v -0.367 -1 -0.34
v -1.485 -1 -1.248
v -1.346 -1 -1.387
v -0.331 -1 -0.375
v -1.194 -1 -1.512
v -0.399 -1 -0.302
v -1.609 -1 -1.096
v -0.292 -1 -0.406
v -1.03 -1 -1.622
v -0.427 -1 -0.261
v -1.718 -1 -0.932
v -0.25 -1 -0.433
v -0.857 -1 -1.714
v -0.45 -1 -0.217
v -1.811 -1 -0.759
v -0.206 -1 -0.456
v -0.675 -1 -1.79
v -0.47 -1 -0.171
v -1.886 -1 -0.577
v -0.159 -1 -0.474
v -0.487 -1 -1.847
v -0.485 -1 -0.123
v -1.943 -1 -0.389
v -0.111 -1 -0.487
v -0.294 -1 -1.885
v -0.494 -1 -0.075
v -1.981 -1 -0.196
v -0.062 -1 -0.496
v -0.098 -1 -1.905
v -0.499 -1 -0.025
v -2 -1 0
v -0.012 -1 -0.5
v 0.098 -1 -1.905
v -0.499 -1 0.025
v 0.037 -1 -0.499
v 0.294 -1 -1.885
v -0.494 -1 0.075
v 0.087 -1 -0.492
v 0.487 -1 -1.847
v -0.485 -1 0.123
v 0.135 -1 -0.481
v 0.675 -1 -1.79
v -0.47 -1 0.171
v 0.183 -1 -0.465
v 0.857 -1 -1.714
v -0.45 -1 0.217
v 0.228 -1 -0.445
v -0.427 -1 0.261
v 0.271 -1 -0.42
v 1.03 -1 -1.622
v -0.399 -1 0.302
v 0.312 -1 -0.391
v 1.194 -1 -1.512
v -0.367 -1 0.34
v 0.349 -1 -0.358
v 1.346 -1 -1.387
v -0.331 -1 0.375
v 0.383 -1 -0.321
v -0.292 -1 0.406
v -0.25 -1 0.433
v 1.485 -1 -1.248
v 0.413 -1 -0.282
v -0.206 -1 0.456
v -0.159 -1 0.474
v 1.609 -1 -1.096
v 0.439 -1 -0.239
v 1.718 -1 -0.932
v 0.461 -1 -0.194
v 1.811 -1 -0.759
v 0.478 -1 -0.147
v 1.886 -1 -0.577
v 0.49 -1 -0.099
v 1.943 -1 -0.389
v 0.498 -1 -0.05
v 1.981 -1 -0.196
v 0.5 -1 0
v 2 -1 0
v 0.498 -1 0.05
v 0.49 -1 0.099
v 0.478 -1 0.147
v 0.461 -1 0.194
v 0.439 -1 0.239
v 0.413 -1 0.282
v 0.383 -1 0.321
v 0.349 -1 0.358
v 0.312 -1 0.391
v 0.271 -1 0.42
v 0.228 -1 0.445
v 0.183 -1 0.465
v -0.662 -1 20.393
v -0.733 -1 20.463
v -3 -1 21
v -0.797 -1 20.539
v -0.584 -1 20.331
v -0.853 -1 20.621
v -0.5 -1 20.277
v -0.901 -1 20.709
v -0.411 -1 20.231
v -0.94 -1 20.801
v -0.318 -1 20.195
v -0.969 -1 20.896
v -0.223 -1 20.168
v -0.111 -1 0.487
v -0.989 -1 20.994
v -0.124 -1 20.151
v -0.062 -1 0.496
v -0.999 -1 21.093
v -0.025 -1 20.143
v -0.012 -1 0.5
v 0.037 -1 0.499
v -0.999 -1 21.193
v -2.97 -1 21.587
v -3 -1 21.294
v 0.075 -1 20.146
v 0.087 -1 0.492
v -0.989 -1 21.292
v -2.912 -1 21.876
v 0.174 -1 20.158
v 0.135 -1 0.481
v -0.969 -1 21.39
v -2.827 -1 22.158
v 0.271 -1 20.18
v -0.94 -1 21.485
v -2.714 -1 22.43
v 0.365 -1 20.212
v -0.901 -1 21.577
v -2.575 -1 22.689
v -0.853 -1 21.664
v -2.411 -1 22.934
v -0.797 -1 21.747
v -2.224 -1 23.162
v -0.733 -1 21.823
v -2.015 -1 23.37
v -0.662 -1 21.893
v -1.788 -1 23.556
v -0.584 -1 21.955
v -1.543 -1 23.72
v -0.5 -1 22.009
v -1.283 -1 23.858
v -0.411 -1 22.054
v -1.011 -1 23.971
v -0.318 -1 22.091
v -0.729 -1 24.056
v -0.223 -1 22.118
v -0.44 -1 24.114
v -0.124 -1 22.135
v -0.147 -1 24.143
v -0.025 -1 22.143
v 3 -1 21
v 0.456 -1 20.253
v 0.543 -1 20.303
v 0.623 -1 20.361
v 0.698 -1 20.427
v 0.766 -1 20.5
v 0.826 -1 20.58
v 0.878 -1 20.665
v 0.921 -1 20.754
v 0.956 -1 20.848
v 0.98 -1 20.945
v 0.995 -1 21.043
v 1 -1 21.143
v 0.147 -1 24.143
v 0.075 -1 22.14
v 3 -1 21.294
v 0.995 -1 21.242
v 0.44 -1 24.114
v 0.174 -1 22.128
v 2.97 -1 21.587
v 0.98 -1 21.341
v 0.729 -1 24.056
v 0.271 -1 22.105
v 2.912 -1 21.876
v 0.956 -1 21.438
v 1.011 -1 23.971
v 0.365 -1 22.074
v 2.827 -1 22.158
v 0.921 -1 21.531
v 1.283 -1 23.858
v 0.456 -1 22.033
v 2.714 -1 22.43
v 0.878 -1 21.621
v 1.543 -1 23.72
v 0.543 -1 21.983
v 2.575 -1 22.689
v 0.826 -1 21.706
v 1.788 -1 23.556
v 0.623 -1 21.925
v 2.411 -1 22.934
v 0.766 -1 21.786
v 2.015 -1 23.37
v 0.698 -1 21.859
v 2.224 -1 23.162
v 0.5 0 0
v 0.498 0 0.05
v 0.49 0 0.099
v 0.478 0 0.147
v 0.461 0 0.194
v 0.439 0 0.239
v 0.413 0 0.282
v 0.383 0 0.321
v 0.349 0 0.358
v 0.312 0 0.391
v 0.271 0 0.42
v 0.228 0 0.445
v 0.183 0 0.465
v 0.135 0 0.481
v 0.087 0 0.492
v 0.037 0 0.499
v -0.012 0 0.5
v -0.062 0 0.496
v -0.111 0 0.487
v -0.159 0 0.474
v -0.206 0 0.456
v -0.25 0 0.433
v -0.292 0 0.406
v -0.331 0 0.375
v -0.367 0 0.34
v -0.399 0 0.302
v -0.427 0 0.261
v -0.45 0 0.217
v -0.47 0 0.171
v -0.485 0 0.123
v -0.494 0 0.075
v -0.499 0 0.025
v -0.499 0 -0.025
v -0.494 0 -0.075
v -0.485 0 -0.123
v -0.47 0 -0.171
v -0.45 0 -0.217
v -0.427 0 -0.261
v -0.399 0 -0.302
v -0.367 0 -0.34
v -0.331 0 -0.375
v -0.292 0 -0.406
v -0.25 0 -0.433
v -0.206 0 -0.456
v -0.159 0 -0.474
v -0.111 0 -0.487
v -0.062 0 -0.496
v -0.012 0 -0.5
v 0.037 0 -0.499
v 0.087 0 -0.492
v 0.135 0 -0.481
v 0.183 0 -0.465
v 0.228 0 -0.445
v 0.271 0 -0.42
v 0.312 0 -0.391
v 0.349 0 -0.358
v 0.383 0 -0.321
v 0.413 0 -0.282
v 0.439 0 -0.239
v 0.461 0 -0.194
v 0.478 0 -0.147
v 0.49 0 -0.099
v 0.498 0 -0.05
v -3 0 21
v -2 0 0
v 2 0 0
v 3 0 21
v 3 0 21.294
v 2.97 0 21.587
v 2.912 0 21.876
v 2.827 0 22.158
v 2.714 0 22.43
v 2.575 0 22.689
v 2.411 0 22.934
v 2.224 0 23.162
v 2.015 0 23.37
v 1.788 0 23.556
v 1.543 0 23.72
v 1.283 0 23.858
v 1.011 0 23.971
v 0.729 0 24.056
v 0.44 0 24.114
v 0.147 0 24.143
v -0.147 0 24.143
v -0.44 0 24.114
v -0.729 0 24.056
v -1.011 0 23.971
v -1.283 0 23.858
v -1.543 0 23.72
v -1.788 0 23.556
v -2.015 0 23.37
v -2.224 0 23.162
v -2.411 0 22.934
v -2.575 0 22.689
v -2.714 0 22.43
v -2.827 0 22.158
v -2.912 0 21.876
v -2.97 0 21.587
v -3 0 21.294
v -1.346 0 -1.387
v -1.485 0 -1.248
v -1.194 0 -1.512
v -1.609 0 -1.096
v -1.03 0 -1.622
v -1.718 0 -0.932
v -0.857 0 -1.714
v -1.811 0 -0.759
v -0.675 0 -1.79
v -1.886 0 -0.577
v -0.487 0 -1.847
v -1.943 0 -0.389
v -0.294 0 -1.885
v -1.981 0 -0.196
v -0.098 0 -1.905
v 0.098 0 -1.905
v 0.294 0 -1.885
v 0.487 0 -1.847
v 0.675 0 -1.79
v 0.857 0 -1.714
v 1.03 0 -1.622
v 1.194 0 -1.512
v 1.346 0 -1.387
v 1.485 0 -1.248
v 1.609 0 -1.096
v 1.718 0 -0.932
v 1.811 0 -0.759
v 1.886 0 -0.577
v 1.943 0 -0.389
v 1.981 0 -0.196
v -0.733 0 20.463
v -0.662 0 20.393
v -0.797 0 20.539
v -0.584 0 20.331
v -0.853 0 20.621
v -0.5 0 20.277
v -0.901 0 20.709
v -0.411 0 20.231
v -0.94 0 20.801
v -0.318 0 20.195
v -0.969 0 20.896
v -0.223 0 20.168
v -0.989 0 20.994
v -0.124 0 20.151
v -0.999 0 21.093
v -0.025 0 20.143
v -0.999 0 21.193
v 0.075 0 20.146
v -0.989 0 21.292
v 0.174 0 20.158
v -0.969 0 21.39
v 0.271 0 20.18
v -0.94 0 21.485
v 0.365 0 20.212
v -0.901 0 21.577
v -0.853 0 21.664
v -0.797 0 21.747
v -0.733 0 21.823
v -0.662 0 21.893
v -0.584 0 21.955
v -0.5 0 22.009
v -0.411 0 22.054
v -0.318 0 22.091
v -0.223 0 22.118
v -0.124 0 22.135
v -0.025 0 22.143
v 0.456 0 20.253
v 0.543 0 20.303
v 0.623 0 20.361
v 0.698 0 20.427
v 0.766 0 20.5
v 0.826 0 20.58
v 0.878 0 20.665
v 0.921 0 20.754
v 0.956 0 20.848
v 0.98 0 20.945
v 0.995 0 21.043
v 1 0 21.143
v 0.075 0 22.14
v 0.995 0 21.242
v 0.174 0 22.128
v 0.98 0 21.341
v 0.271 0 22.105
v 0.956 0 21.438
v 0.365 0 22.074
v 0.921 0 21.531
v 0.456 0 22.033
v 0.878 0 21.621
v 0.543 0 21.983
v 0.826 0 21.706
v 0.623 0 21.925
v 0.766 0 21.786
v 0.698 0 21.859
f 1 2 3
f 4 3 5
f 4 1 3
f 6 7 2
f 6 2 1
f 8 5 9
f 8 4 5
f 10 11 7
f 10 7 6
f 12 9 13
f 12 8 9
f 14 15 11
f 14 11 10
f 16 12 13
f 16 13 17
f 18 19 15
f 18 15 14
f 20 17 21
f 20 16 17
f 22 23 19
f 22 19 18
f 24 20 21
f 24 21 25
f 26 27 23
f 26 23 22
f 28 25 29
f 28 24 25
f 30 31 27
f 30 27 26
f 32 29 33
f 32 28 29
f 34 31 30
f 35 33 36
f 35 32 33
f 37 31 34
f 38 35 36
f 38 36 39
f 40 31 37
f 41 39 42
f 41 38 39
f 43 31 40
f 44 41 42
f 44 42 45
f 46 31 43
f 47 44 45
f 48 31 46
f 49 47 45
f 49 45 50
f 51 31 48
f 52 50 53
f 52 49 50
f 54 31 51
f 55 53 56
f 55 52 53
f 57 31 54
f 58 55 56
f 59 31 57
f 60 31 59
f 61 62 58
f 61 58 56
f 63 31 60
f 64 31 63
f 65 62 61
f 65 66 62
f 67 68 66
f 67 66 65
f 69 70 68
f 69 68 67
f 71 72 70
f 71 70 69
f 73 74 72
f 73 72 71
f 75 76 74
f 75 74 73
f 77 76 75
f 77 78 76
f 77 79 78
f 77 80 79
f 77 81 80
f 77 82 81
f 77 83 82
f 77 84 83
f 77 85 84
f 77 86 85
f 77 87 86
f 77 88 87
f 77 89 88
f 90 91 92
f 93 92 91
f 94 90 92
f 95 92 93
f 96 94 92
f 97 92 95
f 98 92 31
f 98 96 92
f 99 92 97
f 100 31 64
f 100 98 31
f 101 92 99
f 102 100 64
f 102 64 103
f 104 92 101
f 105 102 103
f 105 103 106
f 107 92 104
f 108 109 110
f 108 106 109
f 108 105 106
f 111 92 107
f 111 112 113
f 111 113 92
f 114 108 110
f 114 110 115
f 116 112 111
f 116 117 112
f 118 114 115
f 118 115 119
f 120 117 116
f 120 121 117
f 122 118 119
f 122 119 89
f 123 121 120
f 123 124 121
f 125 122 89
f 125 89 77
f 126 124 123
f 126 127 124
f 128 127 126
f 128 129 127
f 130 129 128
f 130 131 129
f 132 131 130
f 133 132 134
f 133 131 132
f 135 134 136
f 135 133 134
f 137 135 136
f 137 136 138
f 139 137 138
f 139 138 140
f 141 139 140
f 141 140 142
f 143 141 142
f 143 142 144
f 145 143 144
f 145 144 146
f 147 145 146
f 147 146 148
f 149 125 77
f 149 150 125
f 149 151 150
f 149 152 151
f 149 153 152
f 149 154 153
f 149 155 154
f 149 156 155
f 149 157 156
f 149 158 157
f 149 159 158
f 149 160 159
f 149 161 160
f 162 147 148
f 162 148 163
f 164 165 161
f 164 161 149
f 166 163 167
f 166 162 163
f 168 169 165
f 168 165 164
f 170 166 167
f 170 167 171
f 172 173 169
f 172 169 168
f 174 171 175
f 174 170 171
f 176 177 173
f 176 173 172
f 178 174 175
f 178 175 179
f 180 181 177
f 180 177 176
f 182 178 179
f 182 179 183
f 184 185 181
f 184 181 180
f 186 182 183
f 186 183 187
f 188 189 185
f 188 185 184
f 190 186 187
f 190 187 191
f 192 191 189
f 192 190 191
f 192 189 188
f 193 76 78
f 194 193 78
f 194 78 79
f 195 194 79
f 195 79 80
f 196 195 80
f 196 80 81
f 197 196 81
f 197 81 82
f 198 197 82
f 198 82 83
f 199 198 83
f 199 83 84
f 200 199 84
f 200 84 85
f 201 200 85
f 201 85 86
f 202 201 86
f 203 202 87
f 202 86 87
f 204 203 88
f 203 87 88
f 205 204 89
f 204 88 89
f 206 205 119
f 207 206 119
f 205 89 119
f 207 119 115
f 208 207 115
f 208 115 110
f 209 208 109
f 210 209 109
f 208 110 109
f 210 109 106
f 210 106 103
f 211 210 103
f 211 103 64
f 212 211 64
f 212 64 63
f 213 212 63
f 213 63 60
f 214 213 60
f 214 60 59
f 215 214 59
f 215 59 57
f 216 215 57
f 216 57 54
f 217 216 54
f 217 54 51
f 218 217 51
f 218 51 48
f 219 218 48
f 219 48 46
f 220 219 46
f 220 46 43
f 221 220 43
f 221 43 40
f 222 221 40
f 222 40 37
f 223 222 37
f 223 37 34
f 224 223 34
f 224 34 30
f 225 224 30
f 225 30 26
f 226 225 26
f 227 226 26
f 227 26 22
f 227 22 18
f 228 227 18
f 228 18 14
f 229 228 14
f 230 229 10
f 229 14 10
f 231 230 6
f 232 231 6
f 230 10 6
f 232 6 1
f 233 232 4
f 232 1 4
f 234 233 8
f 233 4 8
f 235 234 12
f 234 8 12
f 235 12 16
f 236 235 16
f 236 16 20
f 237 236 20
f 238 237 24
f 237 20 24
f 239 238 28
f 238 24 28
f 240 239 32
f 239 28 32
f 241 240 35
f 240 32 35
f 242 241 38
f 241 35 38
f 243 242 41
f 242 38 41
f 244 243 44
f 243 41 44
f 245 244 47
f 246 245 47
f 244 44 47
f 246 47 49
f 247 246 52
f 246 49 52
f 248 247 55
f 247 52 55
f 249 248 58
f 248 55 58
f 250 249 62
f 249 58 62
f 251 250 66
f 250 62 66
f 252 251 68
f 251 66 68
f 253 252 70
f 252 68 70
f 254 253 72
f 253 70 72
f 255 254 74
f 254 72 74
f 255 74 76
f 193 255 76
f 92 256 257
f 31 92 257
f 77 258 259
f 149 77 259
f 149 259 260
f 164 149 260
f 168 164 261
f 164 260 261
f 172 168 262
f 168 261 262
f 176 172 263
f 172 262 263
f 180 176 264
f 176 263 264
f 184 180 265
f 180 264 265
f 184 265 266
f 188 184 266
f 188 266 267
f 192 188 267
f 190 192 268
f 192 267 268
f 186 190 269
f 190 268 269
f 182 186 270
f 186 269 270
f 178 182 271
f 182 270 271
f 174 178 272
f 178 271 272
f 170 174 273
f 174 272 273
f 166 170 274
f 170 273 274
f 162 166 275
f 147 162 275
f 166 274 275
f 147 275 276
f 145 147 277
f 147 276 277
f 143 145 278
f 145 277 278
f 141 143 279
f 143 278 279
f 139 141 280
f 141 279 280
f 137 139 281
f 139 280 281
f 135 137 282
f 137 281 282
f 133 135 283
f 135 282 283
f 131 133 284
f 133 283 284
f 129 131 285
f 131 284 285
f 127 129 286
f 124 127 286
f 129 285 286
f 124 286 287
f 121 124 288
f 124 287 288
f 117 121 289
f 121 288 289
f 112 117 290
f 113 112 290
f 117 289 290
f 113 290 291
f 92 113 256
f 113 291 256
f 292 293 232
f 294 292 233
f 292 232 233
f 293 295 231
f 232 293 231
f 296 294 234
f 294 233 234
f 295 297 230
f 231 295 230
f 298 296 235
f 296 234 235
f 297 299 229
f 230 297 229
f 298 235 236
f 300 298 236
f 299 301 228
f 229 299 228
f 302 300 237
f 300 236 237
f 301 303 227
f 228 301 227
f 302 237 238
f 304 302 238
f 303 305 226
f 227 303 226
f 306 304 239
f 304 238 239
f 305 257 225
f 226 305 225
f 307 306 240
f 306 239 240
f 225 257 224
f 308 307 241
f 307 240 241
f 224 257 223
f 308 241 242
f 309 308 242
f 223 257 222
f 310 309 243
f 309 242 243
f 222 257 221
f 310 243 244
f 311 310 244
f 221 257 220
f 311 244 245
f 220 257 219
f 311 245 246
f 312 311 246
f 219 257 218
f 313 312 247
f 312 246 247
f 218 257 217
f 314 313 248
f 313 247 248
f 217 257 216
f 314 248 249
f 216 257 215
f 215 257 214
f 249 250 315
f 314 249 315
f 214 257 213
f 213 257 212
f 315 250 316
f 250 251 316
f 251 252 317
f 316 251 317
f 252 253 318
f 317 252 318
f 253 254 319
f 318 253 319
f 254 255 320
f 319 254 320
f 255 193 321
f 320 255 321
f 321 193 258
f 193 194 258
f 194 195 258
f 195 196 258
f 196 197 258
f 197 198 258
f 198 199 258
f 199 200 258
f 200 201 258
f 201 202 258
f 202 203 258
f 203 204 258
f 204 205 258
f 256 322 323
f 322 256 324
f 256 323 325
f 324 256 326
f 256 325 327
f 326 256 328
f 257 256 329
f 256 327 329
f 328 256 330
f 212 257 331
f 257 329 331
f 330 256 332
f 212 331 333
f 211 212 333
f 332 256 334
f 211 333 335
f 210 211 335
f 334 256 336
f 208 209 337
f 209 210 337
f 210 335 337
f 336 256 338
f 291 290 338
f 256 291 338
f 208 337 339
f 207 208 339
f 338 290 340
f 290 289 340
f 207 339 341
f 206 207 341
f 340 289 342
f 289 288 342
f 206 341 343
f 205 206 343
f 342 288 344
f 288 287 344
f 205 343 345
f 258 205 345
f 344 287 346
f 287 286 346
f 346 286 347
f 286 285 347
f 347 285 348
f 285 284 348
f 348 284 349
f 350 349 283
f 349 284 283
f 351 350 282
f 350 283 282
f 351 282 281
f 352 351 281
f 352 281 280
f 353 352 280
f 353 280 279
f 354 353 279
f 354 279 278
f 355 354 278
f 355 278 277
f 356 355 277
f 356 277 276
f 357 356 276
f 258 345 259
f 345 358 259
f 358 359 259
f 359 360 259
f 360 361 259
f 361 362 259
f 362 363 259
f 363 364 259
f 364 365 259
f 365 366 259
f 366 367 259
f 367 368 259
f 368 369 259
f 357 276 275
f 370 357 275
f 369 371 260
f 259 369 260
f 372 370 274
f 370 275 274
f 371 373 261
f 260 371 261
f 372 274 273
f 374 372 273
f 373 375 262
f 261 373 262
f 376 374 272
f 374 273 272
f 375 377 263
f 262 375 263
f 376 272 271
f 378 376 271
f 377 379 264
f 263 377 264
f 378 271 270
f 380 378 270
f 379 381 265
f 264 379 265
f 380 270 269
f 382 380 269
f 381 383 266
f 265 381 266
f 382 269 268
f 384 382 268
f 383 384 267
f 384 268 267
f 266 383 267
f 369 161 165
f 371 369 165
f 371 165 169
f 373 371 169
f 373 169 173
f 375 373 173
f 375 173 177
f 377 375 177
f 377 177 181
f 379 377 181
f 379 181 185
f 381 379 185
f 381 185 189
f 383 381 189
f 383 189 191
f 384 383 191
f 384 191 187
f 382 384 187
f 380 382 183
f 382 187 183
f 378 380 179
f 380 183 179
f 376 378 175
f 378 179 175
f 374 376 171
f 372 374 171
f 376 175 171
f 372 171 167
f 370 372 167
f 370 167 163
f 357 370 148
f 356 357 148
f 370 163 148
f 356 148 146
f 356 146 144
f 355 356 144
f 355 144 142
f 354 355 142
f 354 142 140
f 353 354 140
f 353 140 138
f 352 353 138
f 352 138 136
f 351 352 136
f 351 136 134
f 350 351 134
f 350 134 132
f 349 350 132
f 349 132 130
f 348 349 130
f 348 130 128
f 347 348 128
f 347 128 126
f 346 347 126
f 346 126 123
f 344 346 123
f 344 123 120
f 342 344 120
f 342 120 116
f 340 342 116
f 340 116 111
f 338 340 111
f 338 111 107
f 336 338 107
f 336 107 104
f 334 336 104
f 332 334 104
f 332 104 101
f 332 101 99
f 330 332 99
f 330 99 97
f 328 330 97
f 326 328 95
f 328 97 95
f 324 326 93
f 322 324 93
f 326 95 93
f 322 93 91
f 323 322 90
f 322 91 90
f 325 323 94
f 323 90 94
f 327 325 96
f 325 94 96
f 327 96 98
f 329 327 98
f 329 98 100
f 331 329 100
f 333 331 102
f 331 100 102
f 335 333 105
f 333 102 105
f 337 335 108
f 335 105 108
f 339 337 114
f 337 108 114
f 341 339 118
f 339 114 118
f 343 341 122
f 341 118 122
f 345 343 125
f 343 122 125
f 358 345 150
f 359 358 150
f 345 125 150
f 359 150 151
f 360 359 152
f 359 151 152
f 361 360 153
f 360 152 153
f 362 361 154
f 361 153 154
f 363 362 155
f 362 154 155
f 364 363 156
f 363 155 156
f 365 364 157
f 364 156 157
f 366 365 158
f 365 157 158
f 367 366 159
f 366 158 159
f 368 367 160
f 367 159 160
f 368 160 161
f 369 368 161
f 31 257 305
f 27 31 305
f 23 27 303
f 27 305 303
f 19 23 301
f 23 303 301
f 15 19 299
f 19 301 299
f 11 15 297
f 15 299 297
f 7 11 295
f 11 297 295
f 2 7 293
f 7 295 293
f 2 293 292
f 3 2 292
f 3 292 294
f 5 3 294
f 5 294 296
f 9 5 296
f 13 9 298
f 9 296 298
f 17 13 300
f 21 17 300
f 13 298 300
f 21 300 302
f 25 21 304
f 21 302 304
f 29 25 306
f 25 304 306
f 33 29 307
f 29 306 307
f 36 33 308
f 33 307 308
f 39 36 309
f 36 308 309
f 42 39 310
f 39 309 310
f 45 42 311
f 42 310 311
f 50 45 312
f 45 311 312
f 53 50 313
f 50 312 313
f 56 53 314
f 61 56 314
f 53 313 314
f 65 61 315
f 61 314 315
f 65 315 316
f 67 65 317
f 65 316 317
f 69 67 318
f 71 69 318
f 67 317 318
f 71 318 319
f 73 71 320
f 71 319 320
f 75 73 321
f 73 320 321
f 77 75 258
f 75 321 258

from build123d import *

# Parameters (mm, degrees)
F1_DEPTH = 1
F2_R     = 1
F2_R_2   = 0.5
F3_DEPTH = 1.001


with BuildPart() as f1:
    # F0 (on Front) → F1 (new body)
    with BuildSketch(Plane.XZ):
        Polygon((-3, 21), (-2, 0), (2, 0), (3, 21), align=None)
        with BuildLine():
            ThreePointArc((3, 21), (0, 24.146257), (-3, 21))
            Line((-3, 21), (3, 21))
        make_face()
        with BuildLine():
            Line((2, 0), (-2, 0))
            ThreePointArc((-2, 0), (0, -1.907028), (2, 0))
        make_face()
    extrude(amount=F1_DEPTH)

    # F2 (on face) → F3 (cut, through all)
    with BuildSketch(Plane.XZ.offset(1)):
        with Locations((0, 21.142857)):
            Circle(F2_R)
        Circle(F2_R_2)
    extrude(amount=-F3_DEPTH, mode=Mode.SUBTRACT)


solid = f1.part
